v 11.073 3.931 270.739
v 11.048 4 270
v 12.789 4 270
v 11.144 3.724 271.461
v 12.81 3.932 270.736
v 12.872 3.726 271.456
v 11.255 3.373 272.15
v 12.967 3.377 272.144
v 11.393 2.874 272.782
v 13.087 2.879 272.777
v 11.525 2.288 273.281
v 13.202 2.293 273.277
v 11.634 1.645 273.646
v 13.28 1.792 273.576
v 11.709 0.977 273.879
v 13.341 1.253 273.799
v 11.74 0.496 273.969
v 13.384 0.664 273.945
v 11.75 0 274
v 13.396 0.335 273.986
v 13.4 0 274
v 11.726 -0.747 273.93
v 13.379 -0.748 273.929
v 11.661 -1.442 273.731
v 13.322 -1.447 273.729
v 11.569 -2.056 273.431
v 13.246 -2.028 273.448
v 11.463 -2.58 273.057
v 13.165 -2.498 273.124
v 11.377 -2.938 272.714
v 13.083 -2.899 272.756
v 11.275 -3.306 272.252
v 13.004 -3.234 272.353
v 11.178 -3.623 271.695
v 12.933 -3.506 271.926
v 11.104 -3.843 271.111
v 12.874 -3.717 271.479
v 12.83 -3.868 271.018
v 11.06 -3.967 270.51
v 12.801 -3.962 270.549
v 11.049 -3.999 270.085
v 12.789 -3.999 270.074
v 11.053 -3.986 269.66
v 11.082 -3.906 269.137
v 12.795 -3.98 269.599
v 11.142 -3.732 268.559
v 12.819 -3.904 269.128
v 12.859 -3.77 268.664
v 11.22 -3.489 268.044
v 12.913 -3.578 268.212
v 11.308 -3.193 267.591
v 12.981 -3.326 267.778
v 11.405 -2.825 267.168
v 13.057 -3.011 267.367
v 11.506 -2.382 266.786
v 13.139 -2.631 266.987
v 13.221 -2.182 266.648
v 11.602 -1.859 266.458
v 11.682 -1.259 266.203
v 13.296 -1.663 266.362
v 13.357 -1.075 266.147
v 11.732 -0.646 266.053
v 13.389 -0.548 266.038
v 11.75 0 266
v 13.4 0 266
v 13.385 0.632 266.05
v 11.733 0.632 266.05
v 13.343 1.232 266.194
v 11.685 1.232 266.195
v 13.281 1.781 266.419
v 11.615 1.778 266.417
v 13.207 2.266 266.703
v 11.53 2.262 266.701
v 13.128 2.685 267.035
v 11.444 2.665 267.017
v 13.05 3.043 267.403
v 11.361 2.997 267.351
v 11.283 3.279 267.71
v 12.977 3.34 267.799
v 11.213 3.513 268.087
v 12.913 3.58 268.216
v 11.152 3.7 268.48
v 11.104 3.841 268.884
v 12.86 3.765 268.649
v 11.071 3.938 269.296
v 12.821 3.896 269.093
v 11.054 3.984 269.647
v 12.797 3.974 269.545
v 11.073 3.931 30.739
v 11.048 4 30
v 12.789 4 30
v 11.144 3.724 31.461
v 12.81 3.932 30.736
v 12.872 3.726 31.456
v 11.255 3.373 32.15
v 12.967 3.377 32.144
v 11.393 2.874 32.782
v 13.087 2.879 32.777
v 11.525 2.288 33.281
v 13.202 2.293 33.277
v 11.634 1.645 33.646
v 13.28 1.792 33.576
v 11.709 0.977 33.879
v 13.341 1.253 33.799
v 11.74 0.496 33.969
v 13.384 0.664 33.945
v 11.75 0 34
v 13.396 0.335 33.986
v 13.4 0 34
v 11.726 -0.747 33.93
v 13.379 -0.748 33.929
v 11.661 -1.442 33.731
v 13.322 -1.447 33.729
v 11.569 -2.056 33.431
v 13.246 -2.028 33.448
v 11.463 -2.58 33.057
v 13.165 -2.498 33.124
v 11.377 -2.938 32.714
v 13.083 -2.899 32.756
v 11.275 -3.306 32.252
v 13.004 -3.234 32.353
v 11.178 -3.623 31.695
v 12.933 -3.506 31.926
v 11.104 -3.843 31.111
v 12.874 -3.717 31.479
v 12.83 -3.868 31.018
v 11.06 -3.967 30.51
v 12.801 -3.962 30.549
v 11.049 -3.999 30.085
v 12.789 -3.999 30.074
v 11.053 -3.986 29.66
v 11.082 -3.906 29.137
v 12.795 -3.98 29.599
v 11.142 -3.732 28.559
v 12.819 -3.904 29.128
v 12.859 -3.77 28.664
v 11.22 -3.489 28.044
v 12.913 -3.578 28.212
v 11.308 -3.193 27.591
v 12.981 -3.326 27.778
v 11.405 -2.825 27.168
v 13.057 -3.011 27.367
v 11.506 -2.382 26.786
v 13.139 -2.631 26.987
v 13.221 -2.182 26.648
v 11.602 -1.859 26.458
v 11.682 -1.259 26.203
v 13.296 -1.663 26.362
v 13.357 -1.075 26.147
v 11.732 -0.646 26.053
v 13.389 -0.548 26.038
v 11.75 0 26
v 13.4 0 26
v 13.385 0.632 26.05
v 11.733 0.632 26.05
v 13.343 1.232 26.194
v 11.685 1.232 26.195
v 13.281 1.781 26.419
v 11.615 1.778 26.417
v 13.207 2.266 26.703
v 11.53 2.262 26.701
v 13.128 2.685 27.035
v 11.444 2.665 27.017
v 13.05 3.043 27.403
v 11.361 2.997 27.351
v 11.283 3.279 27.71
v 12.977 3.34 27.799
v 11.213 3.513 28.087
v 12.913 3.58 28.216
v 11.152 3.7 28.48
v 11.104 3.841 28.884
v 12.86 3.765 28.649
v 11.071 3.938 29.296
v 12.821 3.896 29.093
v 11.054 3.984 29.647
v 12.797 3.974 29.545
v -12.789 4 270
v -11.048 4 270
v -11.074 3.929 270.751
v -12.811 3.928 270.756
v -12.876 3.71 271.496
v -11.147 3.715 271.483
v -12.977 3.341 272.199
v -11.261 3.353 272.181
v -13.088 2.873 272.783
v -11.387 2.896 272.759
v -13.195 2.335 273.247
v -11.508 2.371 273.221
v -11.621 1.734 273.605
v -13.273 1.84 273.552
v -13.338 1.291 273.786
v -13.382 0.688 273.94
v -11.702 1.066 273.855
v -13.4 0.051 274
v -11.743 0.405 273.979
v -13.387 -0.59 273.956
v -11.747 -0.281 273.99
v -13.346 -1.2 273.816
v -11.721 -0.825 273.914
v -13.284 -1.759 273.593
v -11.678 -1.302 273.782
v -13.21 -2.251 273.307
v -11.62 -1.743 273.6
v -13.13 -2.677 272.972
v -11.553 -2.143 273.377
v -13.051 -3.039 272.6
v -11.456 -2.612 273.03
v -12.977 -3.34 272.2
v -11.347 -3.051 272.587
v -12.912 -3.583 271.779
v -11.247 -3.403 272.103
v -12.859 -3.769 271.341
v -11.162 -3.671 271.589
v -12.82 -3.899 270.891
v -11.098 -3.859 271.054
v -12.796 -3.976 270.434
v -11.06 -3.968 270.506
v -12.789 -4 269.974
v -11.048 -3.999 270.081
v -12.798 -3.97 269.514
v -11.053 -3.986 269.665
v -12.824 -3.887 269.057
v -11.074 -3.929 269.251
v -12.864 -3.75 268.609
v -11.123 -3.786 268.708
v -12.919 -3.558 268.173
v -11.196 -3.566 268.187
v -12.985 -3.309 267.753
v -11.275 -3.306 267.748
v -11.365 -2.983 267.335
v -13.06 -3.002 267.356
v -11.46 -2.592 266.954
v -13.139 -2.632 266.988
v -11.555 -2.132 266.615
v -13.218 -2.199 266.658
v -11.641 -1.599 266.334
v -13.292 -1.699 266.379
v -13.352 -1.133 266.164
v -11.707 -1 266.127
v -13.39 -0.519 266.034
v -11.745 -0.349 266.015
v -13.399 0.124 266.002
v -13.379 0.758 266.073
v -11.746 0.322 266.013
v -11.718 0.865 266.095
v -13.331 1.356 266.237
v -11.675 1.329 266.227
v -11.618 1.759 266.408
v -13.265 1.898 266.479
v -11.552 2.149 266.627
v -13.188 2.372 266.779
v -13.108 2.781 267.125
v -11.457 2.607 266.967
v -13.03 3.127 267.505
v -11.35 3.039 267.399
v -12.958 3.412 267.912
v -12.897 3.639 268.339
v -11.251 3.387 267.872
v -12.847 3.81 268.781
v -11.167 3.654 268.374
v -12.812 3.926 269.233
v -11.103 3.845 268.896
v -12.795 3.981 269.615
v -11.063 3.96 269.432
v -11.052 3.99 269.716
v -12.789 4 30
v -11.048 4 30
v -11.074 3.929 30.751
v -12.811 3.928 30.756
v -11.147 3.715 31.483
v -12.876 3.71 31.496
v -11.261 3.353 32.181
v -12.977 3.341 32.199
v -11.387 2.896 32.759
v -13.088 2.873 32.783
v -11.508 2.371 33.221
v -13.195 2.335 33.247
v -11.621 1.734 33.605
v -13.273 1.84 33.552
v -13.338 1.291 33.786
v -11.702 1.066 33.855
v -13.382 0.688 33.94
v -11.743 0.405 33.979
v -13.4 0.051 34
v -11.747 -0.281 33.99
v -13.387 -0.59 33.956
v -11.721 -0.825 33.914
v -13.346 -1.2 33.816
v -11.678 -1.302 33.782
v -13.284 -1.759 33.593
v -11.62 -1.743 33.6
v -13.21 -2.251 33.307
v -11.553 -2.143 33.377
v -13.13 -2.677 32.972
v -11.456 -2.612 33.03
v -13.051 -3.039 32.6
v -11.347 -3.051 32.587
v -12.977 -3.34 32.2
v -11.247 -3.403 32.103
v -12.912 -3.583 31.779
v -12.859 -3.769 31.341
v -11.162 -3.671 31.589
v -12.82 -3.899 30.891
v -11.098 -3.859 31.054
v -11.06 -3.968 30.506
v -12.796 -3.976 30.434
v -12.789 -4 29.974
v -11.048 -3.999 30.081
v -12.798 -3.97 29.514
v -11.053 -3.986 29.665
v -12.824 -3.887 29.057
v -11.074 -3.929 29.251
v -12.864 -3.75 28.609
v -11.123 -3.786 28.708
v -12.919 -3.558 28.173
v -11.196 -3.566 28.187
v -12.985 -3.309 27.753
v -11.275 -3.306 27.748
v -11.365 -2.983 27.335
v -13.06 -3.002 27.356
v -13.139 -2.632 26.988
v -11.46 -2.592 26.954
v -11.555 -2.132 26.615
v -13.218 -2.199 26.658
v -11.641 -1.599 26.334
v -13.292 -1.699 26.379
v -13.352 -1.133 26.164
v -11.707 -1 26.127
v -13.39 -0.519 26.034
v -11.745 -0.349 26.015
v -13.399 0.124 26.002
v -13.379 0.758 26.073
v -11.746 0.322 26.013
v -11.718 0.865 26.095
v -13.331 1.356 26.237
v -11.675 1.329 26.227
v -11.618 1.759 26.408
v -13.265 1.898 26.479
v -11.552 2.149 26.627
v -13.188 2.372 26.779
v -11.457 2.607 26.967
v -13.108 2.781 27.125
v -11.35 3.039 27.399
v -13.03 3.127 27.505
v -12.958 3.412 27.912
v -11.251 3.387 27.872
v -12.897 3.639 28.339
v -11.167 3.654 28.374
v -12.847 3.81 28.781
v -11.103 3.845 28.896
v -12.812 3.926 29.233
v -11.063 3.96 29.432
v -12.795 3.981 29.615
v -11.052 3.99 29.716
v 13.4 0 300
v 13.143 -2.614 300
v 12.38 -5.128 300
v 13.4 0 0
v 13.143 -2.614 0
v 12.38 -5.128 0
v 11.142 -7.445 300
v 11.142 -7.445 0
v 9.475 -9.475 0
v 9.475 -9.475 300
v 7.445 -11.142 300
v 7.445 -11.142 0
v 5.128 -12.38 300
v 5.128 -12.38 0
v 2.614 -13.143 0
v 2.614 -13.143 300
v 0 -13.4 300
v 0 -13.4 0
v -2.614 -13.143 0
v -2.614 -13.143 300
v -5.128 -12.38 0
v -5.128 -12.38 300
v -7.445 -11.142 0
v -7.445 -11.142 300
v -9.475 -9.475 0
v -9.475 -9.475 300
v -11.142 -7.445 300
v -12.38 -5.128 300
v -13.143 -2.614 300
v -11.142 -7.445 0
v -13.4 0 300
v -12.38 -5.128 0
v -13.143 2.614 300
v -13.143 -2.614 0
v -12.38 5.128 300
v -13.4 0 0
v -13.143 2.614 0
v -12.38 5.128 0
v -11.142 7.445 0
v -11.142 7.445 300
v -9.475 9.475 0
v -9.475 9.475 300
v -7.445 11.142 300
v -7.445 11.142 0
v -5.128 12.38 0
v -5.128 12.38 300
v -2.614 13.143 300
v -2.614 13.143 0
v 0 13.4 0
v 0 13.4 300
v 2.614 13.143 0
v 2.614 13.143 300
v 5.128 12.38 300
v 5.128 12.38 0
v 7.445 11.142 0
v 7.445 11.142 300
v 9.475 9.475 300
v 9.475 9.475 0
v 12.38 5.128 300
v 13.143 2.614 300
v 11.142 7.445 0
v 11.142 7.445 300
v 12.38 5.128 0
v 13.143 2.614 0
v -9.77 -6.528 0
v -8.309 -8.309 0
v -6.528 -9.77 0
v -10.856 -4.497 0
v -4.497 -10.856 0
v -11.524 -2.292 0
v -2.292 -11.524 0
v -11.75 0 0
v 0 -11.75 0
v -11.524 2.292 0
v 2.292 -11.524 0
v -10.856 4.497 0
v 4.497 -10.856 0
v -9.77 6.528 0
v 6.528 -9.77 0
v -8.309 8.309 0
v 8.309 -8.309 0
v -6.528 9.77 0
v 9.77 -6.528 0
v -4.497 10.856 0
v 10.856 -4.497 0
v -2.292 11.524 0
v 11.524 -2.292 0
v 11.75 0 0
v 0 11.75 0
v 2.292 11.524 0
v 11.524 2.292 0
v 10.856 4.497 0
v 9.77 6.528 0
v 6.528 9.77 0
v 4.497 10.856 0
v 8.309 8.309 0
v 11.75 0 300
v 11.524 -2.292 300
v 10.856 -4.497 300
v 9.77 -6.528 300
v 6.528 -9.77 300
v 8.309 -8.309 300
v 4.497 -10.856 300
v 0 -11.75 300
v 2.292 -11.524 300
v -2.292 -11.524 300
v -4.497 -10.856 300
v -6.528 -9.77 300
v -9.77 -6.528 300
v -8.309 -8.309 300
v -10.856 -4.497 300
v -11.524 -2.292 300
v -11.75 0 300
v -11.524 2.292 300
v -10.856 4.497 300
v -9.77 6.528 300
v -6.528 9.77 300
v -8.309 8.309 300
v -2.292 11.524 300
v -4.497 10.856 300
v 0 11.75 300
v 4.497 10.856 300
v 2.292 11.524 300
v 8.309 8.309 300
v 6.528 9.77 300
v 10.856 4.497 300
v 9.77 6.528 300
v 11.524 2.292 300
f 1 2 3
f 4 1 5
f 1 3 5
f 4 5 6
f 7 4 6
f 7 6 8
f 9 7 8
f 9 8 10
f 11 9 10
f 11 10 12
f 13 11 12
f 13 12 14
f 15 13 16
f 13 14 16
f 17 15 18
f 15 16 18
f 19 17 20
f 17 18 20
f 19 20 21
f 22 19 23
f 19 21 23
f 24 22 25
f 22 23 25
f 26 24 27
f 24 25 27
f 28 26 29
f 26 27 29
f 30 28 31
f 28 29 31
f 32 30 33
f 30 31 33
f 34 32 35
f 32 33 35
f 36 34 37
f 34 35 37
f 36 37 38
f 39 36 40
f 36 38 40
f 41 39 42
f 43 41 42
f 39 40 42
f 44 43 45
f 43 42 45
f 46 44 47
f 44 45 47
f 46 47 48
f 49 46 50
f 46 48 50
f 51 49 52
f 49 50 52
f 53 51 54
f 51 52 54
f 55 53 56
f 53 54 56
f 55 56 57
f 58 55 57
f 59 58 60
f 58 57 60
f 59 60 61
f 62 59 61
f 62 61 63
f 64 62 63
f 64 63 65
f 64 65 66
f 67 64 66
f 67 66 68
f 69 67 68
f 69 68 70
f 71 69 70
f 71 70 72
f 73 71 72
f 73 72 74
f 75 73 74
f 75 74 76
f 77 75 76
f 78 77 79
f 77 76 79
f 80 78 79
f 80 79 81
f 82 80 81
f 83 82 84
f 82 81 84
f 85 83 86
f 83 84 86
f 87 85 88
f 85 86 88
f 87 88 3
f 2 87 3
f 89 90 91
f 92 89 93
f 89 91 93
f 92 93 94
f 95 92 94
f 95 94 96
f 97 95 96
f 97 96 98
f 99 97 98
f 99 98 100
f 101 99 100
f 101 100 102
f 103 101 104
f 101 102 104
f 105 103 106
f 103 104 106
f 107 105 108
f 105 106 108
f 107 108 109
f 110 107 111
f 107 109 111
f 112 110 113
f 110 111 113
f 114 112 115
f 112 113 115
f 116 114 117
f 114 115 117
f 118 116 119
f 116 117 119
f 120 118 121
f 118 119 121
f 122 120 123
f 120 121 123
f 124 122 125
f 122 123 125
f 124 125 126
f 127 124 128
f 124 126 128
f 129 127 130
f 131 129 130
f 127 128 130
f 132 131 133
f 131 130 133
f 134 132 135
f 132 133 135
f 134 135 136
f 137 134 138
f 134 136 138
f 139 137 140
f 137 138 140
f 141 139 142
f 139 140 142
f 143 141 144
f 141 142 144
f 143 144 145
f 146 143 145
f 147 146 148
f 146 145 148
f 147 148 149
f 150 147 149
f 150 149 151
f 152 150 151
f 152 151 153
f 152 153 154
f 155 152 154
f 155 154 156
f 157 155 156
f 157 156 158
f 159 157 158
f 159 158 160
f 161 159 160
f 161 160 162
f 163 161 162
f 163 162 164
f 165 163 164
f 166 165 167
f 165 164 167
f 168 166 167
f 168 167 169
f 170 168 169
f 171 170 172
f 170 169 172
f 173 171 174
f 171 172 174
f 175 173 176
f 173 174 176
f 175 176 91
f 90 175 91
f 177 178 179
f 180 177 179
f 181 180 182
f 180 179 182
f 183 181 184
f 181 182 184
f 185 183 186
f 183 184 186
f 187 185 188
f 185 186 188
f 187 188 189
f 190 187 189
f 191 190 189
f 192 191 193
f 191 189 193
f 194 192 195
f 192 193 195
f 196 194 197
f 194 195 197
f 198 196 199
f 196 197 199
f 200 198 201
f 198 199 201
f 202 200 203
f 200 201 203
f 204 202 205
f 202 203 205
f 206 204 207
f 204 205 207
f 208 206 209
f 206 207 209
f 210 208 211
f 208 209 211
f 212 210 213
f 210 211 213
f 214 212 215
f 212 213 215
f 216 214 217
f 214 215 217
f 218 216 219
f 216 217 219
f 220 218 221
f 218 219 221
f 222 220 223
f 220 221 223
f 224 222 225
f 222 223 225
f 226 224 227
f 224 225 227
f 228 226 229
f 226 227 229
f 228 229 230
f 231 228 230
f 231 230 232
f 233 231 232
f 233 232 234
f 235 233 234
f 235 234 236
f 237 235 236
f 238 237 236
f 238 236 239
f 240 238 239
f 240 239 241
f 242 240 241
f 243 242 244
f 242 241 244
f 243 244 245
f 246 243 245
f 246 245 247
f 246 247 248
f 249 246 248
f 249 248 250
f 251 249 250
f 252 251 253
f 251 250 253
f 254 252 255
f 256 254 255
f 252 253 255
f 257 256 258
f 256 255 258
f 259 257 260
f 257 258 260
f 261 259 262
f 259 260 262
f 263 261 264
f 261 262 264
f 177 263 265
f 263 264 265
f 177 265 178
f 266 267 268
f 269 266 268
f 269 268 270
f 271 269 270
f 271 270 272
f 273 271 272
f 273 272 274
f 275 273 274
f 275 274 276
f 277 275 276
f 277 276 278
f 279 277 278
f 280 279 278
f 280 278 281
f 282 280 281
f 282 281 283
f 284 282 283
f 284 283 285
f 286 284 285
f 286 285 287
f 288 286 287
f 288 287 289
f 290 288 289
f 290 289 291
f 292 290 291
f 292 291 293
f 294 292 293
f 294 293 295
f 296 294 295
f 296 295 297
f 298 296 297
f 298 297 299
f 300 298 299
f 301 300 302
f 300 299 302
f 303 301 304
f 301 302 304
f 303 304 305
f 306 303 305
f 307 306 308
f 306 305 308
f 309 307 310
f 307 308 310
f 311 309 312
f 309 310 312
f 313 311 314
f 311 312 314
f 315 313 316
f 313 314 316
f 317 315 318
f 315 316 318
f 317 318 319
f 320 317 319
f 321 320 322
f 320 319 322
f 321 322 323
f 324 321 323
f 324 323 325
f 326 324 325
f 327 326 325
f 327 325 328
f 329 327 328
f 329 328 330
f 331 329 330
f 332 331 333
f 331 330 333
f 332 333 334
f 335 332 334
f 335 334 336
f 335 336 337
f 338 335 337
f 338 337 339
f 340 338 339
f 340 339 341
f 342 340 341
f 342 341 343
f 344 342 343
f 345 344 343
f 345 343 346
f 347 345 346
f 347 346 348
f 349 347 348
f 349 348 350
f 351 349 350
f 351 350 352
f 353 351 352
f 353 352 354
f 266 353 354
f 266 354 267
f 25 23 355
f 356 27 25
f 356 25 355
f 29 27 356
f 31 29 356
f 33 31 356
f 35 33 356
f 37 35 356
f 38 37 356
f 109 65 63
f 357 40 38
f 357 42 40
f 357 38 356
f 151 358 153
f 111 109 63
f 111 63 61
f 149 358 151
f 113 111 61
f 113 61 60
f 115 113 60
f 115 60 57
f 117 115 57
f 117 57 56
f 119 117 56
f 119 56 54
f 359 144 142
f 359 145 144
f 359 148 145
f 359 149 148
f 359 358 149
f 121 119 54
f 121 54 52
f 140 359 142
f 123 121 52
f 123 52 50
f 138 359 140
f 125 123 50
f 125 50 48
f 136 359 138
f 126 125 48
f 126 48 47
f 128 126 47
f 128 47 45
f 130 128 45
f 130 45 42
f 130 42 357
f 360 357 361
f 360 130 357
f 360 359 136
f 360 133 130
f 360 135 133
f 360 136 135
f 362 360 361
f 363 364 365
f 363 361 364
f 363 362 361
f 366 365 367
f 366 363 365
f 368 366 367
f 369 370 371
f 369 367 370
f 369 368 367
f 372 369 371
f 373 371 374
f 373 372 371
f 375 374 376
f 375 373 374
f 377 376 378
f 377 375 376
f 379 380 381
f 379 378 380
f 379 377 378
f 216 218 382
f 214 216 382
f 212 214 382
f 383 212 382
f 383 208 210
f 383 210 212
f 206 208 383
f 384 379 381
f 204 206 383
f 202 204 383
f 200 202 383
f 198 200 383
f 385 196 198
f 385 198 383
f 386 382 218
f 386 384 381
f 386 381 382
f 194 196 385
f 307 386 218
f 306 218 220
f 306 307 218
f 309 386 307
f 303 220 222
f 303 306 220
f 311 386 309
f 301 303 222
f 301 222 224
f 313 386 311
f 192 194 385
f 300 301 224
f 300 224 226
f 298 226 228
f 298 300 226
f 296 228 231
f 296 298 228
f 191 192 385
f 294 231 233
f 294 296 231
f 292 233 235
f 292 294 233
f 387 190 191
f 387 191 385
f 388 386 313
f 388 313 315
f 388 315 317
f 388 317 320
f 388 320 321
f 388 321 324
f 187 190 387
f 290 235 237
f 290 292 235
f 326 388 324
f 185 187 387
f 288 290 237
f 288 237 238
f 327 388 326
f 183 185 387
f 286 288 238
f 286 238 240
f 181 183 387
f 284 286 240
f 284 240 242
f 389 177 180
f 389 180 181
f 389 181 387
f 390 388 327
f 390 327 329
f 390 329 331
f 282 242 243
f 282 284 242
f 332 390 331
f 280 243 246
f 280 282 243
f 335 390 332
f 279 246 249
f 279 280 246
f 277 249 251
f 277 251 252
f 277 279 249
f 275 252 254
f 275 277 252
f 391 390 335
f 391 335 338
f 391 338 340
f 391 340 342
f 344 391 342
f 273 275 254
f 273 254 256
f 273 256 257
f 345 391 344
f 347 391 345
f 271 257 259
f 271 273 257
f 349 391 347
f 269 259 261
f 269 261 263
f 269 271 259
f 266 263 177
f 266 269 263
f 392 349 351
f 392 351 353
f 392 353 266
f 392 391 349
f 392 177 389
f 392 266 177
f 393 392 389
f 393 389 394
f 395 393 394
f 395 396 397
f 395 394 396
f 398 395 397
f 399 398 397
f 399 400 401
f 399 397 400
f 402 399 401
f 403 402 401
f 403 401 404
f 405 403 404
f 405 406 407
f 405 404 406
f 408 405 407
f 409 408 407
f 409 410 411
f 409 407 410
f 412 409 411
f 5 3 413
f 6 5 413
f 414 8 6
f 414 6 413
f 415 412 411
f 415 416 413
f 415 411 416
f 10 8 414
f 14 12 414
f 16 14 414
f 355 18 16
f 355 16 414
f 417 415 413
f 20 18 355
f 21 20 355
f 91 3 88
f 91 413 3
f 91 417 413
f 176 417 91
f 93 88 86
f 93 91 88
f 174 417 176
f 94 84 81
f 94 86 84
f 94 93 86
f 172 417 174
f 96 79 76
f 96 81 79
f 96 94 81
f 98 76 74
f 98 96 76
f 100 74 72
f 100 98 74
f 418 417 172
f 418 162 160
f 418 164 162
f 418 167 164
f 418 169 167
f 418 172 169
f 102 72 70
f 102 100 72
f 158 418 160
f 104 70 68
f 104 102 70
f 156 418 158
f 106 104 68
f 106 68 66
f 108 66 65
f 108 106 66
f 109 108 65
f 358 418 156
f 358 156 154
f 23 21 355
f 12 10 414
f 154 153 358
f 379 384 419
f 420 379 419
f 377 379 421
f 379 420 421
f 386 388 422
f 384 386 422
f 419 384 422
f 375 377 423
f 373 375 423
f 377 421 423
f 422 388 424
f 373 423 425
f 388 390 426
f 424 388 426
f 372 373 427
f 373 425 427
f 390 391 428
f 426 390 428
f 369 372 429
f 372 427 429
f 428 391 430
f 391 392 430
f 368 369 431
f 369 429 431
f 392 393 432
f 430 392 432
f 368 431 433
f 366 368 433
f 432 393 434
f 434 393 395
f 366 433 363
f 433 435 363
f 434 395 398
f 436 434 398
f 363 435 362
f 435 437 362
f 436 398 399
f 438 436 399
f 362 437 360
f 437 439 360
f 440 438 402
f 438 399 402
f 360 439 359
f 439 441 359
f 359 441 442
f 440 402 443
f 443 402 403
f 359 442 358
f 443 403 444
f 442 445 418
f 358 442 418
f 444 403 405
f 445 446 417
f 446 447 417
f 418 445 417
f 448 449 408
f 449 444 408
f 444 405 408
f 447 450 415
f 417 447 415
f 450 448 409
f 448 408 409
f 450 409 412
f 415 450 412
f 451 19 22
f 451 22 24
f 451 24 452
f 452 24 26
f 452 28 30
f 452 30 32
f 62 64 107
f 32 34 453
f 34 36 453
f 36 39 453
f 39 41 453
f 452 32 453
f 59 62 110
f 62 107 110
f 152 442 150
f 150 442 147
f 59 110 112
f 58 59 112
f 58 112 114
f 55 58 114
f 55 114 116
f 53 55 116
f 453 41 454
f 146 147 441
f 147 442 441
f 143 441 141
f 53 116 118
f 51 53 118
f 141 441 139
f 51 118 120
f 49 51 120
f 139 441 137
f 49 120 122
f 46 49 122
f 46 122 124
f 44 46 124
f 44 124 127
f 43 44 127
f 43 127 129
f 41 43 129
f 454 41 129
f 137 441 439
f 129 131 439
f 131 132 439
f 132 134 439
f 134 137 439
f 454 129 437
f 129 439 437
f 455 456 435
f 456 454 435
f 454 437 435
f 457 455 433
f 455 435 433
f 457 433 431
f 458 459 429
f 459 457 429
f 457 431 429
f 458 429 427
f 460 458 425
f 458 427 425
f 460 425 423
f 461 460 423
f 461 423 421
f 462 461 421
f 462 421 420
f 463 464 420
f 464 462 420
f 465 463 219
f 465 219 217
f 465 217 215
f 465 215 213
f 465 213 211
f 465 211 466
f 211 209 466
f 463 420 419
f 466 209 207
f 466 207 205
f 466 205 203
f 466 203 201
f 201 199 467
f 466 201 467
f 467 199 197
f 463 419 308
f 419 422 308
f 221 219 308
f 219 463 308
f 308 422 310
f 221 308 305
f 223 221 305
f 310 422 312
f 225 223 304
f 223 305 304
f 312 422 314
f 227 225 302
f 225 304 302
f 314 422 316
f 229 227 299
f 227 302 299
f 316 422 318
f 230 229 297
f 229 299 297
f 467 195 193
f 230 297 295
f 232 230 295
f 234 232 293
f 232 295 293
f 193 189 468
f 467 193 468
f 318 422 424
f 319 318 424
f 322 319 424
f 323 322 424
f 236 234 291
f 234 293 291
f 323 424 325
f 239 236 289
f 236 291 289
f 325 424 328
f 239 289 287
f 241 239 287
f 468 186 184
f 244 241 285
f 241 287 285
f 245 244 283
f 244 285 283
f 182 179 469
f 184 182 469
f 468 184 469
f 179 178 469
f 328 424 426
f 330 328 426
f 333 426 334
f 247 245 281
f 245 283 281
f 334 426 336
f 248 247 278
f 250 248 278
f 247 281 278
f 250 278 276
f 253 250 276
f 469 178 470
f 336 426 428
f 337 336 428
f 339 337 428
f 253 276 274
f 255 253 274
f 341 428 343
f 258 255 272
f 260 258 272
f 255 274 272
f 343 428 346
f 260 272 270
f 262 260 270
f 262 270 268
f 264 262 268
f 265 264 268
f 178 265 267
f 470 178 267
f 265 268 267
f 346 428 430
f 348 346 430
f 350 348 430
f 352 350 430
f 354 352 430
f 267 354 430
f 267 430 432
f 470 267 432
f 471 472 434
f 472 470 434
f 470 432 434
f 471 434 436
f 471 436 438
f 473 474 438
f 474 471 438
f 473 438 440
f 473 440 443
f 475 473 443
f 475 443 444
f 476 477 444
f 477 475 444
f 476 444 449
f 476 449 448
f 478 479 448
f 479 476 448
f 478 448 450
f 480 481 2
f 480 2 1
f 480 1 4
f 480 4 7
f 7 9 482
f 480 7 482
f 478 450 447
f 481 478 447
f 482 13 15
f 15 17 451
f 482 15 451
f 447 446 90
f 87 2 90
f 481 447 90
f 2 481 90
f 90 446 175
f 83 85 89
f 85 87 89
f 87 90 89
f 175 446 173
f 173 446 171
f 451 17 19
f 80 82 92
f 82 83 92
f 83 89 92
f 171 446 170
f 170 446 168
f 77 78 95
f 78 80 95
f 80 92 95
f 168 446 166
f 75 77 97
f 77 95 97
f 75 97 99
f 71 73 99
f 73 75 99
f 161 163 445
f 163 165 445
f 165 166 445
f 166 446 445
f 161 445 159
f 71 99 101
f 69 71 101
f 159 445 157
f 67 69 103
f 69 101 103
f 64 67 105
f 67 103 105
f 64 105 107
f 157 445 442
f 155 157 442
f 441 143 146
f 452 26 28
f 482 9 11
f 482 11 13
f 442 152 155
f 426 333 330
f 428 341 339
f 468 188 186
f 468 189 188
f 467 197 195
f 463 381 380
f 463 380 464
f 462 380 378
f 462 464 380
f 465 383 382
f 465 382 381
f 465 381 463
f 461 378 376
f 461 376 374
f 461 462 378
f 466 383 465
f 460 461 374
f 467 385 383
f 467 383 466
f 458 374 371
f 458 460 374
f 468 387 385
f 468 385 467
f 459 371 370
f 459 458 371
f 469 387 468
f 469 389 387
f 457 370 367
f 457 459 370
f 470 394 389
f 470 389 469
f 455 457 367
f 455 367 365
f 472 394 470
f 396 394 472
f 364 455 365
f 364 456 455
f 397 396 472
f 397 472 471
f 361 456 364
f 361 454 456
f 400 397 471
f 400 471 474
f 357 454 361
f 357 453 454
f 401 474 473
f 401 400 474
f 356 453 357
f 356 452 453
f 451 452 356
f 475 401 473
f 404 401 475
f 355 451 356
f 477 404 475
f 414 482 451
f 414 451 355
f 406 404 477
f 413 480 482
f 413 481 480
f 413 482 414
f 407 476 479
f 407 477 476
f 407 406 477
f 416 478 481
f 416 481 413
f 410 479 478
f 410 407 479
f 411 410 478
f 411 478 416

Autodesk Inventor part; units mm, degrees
ref_plane "XZ Plane" through (0, 0, 0) normal (0, 1, 0) x (-1, 0, 0)
ref_plane "XY Plane" through (0, 0, 0) normal (0, 0, 1) x (1, 0, 0)
sketch "Sketch1" plane through (0, 0, 0) normal (0, 0, 1) x (1, 0, 0)
  circle A0 centre (0, 0) radius 13.4
  circle A1 centre (0, 0) radius 11.75
  dimension "d0" = 26.8
  dimension "d3" = 23.5
extrude "Extrusion1" add sketch "Sketch1" along normal blind 300
ref_plane "Work Plane1" through (13.4, 0, 0) normal (1, 0, 0) x (0, 1, 0)
sketch "Sketch2" plane through (13.4, 0, 0) normal (1, 0, 0) x (0, 1, 0)
  circle A0 centre (0, 30) radius 4
  line L0 (0, -60) -> (0, 360) projected
  line L1 (13.4, 0) -> (-13.4, 0) projected
  circle A1 centre (0, 270) radius 4
  line L2 (13.4, 300) -> (-13.4, 300) projected
  point P0 (0, 0)
  dimension "d4" = 8
  dimension "d5" = 30
  dimension "d6" = 8
  dimension "d7" = 30
extrude "Extrusion2" cut sketch "Sketch2" against normal through all
equation "\"d0\" = PVC_out"
equation "\"d3\" = PVC_in"
equation "\"PVC_out\" = 26.8"
equation "\"PVC_in\" = 23.5"
properties part number "Steering PVC" material "PVC-Piping"
